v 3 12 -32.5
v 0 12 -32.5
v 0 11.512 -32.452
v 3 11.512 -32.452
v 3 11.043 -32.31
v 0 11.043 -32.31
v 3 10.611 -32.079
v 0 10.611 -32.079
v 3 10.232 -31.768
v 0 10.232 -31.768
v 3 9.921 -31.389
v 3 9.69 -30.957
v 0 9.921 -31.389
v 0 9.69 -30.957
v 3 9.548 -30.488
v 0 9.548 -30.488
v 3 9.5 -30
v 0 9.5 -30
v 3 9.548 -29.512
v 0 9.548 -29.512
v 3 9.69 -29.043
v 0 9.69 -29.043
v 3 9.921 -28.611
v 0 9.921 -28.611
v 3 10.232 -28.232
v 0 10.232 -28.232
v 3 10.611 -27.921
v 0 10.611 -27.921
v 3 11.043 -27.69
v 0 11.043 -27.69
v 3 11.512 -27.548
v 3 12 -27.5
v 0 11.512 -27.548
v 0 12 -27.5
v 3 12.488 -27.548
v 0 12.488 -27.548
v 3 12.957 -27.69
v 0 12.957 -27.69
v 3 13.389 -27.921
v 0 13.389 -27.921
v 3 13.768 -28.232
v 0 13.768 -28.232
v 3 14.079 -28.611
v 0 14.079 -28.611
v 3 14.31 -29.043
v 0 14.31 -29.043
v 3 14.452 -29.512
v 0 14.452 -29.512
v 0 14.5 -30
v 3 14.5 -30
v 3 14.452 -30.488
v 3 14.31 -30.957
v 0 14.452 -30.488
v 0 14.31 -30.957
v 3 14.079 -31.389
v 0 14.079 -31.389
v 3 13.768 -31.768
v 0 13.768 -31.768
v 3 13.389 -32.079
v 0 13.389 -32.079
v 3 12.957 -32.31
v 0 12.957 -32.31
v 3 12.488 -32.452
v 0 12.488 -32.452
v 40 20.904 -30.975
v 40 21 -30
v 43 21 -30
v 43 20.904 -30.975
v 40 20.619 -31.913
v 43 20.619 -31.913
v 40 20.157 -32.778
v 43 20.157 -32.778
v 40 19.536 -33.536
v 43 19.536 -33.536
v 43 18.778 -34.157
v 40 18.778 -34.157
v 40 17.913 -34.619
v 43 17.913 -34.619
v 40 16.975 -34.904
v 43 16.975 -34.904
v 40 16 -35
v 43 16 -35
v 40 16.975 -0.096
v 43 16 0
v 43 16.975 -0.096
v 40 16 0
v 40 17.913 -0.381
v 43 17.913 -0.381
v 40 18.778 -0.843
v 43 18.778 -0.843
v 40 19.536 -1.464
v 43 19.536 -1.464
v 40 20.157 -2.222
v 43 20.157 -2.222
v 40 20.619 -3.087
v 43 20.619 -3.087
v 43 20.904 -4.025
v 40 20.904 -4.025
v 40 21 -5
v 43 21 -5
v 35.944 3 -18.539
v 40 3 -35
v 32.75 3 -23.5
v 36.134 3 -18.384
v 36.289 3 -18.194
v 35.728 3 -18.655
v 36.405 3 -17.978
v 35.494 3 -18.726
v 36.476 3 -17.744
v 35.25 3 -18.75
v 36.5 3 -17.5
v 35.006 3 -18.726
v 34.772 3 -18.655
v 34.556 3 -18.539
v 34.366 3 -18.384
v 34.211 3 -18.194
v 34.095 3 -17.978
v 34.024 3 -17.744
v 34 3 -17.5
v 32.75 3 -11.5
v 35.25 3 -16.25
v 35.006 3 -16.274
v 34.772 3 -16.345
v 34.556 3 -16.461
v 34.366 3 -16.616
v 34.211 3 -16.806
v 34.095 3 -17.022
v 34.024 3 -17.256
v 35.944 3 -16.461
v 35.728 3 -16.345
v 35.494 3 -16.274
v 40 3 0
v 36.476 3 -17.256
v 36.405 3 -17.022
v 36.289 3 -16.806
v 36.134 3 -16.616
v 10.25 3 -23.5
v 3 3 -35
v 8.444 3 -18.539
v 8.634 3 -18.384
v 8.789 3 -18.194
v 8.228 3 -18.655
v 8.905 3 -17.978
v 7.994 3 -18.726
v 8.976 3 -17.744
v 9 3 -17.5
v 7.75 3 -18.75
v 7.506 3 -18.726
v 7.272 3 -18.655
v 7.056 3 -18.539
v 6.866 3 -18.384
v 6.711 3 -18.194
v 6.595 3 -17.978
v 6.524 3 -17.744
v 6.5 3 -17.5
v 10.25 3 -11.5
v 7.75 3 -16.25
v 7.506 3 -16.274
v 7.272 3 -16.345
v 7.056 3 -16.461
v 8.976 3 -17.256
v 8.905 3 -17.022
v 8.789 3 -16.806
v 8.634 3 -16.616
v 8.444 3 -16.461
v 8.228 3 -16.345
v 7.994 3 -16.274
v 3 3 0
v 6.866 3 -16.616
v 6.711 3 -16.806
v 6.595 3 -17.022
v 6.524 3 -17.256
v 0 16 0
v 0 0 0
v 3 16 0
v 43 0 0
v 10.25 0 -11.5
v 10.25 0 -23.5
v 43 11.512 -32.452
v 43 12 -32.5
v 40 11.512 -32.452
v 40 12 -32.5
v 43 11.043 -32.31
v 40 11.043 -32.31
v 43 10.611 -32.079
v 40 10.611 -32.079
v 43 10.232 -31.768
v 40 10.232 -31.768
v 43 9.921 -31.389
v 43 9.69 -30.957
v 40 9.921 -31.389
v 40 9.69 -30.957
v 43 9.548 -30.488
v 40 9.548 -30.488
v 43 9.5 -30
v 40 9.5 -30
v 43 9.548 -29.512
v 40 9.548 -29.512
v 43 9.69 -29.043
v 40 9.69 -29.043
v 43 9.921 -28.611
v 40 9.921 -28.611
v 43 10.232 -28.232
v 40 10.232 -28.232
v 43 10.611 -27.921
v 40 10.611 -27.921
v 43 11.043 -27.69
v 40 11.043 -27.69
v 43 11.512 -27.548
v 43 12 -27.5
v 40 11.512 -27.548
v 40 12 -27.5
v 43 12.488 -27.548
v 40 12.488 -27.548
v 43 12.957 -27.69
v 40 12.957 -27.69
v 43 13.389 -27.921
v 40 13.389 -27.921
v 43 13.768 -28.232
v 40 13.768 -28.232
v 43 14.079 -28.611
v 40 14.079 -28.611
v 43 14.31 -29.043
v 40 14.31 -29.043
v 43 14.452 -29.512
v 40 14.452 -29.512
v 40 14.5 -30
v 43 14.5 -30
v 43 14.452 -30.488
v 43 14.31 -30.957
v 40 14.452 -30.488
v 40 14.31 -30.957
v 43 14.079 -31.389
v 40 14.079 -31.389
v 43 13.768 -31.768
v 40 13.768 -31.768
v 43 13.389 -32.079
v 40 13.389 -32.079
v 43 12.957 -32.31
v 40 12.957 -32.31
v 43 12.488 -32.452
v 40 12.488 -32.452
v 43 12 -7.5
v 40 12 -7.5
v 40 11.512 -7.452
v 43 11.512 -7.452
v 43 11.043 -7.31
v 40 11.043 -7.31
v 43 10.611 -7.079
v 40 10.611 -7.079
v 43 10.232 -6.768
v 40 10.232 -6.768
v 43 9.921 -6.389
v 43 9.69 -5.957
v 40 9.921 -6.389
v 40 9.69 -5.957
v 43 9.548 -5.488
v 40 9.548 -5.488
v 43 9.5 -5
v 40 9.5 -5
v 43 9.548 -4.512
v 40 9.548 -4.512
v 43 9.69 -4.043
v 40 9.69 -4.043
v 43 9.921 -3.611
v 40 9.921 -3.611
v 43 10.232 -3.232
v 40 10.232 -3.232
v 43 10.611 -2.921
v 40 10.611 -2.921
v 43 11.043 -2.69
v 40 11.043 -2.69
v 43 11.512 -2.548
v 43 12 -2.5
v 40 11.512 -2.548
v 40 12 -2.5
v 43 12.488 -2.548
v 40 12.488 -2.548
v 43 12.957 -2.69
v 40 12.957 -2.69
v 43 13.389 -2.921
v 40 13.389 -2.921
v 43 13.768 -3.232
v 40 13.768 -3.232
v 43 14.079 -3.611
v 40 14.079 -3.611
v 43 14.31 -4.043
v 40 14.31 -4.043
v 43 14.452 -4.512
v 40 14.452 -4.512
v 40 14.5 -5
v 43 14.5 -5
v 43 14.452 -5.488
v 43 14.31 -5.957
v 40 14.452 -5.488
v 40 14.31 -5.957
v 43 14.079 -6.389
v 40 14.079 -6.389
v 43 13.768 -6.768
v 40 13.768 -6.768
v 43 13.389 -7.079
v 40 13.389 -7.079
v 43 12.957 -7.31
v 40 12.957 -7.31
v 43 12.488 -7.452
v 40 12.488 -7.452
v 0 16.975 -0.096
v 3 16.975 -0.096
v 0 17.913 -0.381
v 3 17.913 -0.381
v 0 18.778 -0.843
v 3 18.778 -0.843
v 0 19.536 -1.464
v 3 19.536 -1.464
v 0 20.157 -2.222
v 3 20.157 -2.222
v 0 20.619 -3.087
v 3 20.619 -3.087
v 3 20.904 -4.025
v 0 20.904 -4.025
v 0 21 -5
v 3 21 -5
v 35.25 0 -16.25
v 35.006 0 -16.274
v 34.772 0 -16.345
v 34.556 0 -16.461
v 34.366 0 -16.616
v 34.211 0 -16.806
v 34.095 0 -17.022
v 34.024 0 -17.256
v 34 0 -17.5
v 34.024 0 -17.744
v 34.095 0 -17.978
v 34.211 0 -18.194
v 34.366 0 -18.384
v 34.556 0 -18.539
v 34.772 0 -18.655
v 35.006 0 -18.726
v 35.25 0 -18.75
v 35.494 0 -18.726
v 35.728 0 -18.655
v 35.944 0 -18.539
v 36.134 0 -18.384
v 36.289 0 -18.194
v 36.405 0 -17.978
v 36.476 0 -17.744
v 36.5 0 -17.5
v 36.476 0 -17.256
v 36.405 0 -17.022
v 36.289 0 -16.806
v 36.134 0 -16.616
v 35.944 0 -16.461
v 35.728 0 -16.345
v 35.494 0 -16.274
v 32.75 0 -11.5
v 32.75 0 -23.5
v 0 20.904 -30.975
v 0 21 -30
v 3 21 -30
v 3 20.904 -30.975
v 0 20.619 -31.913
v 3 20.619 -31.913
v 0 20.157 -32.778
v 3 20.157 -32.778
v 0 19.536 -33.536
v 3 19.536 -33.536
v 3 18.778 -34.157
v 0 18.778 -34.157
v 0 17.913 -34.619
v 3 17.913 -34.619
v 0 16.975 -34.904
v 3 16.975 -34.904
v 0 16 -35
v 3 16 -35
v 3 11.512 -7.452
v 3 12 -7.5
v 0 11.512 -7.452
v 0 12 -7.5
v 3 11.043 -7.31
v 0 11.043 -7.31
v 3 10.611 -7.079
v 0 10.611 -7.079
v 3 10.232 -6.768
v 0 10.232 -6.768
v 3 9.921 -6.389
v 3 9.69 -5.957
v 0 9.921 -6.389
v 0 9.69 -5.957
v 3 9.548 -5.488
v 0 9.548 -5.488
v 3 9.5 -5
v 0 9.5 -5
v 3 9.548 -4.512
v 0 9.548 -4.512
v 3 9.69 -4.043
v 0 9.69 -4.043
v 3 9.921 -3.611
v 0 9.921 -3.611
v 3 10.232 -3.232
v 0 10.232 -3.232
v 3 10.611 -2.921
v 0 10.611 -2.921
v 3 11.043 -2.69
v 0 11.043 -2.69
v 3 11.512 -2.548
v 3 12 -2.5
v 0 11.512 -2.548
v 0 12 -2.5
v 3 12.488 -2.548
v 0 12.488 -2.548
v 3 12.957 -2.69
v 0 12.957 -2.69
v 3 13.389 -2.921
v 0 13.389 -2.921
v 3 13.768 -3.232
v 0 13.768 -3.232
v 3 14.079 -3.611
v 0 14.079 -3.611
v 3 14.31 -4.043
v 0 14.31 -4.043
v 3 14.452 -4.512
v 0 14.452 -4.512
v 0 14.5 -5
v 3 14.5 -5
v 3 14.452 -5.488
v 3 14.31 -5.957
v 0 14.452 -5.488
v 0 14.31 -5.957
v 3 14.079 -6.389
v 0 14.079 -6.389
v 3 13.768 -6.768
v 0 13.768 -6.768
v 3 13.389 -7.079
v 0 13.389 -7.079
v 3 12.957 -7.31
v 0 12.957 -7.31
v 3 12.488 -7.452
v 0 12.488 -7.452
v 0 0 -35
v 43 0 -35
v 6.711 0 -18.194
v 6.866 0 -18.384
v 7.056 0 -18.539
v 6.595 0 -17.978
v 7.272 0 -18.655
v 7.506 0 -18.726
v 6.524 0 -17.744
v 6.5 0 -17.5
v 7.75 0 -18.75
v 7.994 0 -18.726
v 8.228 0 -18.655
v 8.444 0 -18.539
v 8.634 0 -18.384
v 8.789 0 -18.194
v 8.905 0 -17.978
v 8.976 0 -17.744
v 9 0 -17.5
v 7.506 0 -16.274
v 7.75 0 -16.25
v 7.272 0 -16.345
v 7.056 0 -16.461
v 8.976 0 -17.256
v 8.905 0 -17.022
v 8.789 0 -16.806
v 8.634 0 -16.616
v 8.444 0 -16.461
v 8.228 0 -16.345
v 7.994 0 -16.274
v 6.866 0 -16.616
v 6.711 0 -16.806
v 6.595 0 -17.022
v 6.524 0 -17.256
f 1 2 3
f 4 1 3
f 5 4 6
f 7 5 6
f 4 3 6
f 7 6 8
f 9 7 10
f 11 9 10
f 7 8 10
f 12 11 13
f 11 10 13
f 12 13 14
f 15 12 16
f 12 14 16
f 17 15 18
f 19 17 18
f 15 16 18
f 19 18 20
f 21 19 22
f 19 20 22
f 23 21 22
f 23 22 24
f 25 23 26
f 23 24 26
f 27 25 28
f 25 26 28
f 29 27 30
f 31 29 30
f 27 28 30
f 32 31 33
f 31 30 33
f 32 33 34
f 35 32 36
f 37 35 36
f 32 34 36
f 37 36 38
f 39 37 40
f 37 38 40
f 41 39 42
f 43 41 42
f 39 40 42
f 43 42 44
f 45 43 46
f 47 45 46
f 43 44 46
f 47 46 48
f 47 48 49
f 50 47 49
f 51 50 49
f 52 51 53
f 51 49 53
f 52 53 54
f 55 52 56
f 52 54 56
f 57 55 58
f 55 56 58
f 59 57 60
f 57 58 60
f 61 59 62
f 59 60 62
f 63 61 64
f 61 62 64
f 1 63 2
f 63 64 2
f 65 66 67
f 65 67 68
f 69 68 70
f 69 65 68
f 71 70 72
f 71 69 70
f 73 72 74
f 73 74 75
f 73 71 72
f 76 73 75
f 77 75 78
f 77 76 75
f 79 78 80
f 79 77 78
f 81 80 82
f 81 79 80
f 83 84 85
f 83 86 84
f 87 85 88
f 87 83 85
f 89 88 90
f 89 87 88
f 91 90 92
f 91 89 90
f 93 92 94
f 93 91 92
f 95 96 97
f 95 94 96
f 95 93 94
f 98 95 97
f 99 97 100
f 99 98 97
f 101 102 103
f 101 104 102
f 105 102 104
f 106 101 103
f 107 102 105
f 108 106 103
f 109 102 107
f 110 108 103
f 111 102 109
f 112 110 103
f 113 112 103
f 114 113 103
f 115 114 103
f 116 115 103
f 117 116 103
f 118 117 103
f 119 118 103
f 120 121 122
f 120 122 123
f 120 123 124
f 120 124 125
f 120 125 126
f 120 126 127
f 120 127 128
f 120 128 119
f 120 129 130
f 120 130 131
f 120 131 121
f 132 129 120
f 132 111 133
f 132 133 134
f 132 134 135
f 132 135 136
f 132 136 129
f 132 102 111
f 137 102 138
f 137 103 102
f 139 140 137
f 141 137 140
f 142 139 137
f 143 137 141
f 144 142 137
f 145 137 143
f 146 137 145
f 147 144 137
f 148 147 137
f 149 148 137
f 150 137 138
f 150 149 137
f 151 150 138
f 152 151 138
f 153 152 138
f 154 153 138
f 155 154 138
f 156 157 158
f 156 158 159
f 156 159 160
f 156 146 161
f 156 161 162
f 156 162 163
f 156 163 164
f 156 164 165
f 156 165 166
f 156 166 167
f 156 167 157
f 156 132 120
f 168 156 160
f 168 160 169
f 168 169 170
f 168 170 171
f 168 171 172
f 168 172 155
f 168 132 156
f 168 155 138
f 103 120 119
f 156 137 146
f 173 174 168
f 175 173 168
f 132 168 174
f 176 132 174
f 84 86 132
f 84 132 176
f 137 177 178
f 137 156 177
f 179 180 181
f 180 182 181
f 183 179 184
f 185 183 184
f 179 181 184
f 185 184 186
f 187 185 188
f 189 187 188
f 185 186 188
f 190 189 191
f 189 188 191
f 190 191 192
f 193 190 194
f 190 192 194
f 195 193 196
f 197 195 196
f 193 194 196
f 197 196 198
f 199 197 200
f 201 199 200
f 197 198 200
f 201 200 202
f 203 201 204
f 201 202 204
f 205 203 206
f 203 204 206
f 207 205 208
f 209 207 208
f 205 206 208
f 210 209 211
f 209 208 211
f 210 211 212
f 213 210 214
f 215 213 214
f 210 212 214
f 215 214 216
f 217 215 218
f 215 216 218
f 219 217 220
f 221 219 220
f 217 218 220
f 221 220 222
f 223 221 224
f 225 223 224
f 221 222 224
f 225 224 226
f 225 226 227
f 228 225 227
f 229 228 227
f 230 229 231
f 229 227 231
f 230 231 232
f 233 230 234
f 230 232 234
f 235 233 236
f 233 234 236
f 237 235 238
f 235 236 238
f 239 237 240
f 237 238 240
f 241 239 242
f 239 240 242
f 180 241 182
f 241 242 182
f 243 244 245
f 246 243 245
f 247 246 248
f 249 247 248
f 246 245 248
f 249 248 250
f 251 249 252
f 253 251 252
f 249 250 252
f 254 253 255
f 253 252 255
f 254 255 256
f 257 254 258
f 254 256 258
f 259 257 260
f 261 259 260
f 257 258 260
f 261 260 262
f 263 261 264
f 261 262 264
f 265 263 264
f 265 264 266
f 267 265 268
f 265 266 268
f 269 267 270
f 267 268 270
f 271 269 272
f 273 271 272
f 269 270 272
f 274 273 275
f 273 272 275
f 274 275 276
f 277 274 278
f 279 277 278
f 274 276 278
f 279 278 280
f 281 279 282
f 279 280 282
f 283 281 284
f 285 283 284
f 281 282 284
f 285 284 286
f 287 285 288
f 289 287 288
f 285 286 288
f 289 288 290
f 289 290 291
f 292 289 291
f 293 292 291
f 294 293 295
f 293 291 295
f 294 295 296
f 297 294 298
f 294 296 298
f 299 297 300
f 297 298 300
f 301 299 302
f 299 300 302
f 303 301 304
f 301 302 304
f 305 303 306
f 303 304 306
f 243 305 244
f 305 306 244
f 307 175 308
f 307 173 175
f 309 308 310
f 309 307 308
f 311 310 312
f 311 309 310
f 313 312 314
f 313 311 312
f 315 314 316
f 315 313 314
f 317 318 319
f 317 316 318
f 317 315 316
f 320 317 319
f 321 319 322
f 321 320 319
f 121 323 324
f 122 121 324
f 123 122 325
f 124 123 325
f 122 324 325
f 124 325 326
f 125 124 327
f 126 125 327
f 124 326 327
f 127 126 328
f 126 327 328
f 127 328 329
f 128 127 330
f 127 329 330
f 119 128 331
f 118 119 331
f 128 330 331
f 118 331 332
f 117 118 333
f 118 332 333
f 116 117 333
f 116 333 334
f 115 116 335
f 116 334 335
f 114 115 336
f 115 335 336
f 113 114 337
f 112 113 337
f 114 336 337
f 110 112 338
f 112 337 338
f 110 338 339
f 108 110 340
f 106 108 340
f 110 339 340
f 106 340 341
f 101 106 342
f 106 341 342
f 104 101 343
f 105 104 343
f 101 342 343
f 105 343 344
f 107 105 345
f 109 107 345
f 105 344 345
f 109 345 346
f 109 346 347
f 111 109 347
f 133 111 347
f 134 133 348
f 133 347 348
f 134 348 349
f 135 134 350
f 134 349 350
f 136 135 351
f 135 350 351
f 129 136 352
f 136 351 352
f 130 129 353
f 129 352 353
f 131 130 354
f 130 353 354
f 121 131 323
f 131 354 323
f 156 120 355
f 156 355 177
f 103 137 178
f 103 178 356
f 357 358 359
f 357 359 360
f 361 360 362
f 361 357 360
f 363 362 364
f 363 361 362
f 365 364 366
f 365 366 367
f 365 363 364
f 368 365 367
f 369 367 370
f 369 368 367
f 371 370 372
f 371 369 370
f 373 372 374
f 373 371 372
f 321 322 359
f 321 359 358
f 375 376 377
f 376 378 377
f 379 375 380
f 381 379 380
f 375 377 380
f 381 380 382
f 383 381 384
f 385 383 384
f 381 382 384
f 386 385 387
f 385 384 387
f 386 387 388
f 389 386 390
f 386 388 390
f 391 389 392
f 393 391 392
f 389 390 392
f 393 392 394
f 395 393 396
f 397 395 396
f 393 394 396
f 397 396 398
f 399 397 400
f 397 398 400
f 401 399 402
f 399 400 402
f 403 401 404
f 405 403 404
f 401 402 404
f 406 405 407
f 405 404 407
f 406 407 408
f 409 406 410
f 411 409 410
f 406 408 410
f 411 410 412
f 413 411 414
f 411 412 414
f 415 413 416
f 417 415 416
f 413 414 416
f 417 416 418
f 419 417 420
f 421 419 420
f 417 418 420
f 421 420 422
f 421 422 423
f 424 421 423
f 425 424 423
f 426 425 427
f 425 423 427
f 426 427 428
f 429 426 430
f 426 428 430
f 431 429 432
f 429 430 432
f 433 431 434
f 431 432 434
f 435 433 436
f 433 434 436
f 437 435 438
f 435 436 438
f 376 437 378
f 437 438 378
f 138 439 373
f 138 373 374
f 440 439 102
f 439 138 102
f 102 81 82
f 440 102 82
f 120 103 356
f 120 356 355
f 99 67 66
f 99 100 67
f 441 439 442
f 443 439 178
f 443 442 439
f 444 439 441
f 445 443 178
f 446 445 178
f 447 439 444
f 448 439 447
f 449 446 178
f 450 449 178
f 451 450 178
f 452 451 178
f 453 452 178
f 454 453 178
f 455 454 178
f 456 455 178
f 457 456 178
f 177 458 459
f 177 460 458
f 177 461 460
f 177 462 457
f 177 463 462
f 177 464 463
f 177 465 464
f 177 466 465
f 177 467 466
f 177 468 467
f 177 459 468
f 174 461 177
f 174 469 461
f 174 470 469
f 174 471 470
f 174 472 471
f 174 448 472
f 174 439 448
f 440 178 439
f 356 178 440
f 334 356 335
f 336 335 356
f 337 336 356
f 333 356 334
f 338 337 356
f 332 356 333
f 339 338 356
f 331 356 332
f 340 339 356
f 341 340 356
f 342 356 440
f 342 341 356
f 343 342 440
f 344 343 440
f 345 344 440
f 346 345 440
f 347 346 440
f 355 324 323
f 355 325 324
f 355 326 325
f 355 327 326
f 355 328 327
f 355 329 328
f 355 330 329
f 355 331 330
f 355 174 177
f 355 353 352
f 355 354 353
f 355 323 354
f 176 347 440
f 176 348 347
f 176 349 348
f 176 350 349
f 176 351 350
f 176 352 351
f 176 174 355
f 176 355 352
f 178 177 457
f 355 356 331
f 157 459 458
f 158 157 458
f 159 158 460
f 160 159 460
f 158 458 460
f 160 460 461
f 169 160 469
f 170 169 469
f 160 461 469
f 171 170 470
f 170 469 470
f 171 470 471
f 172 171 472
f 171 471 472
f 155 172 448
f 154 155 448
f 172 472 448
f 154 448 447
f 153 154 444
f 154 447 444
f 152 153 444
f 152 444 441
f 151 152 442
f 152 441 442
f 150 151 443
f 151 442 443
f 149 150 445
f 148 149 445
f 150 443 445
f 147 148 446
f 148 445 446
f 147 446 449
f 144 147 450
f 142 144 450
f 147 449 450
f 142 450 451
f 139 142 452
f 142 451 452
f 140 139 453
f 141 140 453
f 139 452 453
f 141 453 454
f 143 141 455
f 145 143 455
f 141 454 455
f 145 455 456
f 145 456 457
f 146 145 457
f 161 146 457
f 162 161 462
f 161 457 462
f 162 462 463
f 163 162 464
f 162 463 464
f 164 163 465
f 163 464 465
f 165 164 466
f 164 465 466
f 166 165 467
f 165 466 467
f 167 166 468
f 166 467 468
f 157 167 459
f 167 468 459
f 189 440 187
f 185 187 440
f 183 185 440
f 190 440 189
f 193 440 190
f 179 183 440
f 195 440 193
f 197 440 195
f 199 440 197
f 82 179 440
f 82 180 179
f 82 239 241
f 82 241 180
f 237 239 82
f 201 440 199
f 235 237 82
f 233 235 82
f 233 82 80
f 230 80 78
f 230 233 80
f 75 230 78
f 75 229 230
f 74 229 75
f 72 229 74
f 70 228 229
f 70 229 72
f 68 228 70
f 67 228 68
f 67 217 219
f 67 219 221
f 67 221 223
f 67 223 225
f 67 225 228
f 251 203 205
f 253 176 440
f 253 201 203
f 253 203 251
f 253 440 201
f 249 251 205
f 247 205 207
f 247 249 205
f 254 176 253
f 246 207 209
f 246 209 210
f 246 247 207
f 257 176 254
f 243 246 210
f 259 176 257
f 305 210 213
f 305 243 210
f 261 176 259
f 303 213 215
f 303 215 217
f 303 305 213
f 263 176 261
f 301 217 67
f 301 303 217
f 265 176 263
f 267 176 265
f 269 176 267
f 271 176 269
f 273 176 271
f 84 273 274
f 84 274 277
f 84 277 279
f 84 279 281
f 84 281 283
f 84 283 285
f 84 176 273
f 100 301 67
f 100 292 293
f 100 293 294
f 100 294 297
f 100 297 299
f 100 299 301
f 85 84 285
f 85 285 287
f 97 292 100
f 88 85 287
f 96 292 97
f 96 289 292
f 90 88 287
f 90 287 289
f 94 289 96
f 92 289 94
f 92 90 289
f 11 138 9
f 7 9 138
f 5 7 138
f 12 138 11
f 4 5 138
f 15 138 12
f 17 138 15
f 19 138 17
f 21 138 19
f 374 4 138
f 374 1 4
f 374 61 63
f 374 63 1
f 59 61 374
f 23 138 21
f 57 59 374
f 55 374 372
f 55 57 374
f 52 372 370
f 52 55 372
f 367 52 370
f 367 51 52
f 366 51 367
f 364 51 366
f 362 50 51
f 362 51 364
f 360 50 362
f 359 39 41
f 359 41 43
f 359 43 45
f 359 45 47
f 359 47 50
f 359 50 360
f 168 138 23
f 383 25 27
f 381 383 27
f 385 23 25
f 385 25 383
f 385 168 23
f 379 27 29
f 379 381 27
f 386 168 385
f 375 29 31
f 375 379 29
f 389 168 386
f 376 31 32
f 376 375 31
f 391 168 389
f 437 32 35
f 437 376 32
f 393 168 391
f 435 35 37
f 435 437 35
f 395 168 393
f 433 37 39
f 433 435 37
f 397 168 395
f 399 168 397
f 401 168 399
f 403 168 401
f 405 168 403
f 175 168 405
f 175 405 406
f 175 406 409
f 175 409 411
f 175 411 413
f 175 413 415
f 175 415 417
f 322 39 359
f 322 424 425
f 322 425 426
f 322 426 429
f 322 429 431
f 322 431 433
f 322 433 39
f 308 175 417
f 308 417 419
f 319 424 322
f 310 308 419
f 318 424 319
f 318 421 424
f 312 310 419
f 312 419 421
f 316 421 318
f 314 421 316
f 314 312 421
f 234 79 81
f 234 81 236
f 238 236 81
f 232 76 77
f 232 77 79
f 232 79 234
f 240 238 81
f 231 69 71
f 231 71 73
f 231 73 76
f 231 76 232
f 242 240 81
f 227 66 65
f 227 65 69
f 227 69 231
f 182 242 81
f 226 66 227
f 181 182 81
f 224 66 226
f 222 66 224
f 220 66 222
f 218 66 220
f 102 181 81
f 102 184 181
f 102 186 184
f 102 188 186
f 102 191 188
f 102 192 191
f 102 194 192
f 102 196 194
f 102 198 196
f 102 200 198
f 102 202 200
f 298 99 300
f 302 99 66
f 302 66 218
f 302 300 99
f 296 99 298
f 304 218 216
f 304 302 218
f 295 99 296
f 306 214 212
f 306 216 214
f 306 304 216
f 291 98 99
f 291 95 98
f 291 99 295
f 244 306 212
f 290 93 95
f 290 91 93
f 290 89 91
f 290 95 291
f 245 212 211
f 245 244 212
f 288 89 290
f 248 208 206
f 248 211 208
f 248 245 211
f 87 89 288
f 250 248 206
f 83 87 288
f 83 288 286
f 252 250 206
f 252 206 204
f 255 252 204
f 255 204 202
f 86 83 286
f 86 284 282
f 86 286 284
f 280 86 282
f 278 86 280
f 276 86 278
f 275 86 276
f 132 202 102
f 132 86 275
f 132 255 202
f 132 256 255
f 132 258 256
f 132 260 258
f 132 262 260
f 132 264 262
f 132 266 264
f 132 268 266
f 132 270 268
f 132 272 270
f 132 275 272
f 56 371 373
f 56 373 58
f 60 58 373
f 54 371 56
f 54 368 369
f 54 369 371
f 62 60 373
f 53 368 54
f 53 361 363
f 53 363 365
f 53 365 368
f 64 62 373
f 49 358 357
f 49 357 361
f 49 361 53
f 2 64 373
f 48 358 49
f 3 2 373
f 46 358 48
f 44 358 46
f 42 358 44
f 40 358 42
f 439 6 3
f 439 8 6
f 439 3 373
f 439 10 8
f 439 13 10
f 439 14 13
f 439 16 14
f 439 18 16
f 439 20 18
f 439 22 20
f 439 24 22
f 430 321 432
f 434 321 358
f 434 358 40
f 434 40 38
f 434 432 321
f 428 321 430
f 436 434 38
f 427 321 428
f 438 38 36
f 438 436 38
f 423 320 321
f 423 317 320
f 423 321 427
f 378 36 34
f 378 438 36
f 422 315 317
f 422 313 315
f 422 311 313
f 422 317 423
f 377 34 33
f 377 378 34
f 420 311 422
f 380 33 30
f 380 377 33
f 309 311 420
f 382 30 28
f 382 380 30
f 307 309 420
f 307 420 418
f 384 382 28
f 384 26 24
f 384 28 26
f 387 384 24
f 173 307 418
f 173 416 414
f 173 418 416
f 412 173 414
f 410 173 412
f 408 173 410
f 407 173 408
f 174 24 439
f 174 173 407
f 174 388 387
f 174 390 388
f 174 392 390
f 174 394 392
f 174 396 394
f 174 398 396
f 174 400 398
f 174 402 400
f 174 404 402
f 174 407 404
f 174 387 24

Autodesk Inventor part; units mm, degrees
ref_plane "YZ Plane" through (0, 0, 0) normal (1, 0, 0) x (0, 1, 0)
ref_plane "XZ Plane" through (0, 0, 0) normal (0, 1, 0) x (-1, 0, 0)
ref_plane "XY Plane" through (0, 0, 0) normal (0, 0, 1) x (1, 0, 0)
sketch "Boceto1" plane through (0, 0, 0) normal (0, 0, 1) x (1, 0, 0)
  line L0 (0, 0) -> (43, 0)
  line L1 (43, 0) -> (43, 21)
  line L2 (43, 21) -> (40, 21)
  line L3 (40, 21) -> (40, 3)
  line L4 (40, 3) -> (3, 3)
  line L5 (3, 3) -> (3, 21)
  line L6 (3, 21) -> (0, 21)
  line L7 (0, 21) -> (0, 0)
extrude "Extrusión1" add sketch "Boceto1" against normal blind 35
fillet "Empalme1" radius 5 4 edges at (1.5, 21, 0) (1.5, 21, -35) (41.5, 21, 0) (41.5, 21, -35)
sketch "Boceto2" plane through (43, 0, 0) normal (1, 0, 0) x (0, 0, -1)
  arc A0 (5, 21) -> (0, 16) centre (5, 16) ccw projected
  circle A1 centre (5, 12) radius 2.5
  circle A2 centre (30, 12) radius 2.5
  point P0 (0, 0)
hole "Agujero1" at (43, 12, -5) at (43, 12, -30) direction (-1, 0, 0) diameter 5 end through all
sketch "Boceto3" plane through (3, 3, 0) normal (0, 1, 0) x (1, 0, 0)
  line L0 (7.25, 23.5) -> (29.75, 23.5)
  line L1 (29.75, 23.5) -> (29.75, 11.5)
  line L2 (29.75, 11.5) -> (7.25, 11.5)
  line L3 (7.25, 11.5) -> (7.25, 23.5)
  point P0 (-3, 0)
  point P1 (0, 35)
extrude "Extrusión2" cut sketch "Boceto3" against normal blind 35
sketch "Boceto4" plane through (3, 3, 0) normal (0, 1, 0) x (1, 0, 0)
  circle A0 centre (32.25, 17.5) radius 1.25
  circle A1 centre (4.75, 17.5) radius 1.25
  point P0 (-3, 0)
hole "Agujero2" at (7.75, 3, -17.5) at (35.25, 3, -17.5) direction (0, -1, 0) diameter 2.5 end through all
properties part number "8"
